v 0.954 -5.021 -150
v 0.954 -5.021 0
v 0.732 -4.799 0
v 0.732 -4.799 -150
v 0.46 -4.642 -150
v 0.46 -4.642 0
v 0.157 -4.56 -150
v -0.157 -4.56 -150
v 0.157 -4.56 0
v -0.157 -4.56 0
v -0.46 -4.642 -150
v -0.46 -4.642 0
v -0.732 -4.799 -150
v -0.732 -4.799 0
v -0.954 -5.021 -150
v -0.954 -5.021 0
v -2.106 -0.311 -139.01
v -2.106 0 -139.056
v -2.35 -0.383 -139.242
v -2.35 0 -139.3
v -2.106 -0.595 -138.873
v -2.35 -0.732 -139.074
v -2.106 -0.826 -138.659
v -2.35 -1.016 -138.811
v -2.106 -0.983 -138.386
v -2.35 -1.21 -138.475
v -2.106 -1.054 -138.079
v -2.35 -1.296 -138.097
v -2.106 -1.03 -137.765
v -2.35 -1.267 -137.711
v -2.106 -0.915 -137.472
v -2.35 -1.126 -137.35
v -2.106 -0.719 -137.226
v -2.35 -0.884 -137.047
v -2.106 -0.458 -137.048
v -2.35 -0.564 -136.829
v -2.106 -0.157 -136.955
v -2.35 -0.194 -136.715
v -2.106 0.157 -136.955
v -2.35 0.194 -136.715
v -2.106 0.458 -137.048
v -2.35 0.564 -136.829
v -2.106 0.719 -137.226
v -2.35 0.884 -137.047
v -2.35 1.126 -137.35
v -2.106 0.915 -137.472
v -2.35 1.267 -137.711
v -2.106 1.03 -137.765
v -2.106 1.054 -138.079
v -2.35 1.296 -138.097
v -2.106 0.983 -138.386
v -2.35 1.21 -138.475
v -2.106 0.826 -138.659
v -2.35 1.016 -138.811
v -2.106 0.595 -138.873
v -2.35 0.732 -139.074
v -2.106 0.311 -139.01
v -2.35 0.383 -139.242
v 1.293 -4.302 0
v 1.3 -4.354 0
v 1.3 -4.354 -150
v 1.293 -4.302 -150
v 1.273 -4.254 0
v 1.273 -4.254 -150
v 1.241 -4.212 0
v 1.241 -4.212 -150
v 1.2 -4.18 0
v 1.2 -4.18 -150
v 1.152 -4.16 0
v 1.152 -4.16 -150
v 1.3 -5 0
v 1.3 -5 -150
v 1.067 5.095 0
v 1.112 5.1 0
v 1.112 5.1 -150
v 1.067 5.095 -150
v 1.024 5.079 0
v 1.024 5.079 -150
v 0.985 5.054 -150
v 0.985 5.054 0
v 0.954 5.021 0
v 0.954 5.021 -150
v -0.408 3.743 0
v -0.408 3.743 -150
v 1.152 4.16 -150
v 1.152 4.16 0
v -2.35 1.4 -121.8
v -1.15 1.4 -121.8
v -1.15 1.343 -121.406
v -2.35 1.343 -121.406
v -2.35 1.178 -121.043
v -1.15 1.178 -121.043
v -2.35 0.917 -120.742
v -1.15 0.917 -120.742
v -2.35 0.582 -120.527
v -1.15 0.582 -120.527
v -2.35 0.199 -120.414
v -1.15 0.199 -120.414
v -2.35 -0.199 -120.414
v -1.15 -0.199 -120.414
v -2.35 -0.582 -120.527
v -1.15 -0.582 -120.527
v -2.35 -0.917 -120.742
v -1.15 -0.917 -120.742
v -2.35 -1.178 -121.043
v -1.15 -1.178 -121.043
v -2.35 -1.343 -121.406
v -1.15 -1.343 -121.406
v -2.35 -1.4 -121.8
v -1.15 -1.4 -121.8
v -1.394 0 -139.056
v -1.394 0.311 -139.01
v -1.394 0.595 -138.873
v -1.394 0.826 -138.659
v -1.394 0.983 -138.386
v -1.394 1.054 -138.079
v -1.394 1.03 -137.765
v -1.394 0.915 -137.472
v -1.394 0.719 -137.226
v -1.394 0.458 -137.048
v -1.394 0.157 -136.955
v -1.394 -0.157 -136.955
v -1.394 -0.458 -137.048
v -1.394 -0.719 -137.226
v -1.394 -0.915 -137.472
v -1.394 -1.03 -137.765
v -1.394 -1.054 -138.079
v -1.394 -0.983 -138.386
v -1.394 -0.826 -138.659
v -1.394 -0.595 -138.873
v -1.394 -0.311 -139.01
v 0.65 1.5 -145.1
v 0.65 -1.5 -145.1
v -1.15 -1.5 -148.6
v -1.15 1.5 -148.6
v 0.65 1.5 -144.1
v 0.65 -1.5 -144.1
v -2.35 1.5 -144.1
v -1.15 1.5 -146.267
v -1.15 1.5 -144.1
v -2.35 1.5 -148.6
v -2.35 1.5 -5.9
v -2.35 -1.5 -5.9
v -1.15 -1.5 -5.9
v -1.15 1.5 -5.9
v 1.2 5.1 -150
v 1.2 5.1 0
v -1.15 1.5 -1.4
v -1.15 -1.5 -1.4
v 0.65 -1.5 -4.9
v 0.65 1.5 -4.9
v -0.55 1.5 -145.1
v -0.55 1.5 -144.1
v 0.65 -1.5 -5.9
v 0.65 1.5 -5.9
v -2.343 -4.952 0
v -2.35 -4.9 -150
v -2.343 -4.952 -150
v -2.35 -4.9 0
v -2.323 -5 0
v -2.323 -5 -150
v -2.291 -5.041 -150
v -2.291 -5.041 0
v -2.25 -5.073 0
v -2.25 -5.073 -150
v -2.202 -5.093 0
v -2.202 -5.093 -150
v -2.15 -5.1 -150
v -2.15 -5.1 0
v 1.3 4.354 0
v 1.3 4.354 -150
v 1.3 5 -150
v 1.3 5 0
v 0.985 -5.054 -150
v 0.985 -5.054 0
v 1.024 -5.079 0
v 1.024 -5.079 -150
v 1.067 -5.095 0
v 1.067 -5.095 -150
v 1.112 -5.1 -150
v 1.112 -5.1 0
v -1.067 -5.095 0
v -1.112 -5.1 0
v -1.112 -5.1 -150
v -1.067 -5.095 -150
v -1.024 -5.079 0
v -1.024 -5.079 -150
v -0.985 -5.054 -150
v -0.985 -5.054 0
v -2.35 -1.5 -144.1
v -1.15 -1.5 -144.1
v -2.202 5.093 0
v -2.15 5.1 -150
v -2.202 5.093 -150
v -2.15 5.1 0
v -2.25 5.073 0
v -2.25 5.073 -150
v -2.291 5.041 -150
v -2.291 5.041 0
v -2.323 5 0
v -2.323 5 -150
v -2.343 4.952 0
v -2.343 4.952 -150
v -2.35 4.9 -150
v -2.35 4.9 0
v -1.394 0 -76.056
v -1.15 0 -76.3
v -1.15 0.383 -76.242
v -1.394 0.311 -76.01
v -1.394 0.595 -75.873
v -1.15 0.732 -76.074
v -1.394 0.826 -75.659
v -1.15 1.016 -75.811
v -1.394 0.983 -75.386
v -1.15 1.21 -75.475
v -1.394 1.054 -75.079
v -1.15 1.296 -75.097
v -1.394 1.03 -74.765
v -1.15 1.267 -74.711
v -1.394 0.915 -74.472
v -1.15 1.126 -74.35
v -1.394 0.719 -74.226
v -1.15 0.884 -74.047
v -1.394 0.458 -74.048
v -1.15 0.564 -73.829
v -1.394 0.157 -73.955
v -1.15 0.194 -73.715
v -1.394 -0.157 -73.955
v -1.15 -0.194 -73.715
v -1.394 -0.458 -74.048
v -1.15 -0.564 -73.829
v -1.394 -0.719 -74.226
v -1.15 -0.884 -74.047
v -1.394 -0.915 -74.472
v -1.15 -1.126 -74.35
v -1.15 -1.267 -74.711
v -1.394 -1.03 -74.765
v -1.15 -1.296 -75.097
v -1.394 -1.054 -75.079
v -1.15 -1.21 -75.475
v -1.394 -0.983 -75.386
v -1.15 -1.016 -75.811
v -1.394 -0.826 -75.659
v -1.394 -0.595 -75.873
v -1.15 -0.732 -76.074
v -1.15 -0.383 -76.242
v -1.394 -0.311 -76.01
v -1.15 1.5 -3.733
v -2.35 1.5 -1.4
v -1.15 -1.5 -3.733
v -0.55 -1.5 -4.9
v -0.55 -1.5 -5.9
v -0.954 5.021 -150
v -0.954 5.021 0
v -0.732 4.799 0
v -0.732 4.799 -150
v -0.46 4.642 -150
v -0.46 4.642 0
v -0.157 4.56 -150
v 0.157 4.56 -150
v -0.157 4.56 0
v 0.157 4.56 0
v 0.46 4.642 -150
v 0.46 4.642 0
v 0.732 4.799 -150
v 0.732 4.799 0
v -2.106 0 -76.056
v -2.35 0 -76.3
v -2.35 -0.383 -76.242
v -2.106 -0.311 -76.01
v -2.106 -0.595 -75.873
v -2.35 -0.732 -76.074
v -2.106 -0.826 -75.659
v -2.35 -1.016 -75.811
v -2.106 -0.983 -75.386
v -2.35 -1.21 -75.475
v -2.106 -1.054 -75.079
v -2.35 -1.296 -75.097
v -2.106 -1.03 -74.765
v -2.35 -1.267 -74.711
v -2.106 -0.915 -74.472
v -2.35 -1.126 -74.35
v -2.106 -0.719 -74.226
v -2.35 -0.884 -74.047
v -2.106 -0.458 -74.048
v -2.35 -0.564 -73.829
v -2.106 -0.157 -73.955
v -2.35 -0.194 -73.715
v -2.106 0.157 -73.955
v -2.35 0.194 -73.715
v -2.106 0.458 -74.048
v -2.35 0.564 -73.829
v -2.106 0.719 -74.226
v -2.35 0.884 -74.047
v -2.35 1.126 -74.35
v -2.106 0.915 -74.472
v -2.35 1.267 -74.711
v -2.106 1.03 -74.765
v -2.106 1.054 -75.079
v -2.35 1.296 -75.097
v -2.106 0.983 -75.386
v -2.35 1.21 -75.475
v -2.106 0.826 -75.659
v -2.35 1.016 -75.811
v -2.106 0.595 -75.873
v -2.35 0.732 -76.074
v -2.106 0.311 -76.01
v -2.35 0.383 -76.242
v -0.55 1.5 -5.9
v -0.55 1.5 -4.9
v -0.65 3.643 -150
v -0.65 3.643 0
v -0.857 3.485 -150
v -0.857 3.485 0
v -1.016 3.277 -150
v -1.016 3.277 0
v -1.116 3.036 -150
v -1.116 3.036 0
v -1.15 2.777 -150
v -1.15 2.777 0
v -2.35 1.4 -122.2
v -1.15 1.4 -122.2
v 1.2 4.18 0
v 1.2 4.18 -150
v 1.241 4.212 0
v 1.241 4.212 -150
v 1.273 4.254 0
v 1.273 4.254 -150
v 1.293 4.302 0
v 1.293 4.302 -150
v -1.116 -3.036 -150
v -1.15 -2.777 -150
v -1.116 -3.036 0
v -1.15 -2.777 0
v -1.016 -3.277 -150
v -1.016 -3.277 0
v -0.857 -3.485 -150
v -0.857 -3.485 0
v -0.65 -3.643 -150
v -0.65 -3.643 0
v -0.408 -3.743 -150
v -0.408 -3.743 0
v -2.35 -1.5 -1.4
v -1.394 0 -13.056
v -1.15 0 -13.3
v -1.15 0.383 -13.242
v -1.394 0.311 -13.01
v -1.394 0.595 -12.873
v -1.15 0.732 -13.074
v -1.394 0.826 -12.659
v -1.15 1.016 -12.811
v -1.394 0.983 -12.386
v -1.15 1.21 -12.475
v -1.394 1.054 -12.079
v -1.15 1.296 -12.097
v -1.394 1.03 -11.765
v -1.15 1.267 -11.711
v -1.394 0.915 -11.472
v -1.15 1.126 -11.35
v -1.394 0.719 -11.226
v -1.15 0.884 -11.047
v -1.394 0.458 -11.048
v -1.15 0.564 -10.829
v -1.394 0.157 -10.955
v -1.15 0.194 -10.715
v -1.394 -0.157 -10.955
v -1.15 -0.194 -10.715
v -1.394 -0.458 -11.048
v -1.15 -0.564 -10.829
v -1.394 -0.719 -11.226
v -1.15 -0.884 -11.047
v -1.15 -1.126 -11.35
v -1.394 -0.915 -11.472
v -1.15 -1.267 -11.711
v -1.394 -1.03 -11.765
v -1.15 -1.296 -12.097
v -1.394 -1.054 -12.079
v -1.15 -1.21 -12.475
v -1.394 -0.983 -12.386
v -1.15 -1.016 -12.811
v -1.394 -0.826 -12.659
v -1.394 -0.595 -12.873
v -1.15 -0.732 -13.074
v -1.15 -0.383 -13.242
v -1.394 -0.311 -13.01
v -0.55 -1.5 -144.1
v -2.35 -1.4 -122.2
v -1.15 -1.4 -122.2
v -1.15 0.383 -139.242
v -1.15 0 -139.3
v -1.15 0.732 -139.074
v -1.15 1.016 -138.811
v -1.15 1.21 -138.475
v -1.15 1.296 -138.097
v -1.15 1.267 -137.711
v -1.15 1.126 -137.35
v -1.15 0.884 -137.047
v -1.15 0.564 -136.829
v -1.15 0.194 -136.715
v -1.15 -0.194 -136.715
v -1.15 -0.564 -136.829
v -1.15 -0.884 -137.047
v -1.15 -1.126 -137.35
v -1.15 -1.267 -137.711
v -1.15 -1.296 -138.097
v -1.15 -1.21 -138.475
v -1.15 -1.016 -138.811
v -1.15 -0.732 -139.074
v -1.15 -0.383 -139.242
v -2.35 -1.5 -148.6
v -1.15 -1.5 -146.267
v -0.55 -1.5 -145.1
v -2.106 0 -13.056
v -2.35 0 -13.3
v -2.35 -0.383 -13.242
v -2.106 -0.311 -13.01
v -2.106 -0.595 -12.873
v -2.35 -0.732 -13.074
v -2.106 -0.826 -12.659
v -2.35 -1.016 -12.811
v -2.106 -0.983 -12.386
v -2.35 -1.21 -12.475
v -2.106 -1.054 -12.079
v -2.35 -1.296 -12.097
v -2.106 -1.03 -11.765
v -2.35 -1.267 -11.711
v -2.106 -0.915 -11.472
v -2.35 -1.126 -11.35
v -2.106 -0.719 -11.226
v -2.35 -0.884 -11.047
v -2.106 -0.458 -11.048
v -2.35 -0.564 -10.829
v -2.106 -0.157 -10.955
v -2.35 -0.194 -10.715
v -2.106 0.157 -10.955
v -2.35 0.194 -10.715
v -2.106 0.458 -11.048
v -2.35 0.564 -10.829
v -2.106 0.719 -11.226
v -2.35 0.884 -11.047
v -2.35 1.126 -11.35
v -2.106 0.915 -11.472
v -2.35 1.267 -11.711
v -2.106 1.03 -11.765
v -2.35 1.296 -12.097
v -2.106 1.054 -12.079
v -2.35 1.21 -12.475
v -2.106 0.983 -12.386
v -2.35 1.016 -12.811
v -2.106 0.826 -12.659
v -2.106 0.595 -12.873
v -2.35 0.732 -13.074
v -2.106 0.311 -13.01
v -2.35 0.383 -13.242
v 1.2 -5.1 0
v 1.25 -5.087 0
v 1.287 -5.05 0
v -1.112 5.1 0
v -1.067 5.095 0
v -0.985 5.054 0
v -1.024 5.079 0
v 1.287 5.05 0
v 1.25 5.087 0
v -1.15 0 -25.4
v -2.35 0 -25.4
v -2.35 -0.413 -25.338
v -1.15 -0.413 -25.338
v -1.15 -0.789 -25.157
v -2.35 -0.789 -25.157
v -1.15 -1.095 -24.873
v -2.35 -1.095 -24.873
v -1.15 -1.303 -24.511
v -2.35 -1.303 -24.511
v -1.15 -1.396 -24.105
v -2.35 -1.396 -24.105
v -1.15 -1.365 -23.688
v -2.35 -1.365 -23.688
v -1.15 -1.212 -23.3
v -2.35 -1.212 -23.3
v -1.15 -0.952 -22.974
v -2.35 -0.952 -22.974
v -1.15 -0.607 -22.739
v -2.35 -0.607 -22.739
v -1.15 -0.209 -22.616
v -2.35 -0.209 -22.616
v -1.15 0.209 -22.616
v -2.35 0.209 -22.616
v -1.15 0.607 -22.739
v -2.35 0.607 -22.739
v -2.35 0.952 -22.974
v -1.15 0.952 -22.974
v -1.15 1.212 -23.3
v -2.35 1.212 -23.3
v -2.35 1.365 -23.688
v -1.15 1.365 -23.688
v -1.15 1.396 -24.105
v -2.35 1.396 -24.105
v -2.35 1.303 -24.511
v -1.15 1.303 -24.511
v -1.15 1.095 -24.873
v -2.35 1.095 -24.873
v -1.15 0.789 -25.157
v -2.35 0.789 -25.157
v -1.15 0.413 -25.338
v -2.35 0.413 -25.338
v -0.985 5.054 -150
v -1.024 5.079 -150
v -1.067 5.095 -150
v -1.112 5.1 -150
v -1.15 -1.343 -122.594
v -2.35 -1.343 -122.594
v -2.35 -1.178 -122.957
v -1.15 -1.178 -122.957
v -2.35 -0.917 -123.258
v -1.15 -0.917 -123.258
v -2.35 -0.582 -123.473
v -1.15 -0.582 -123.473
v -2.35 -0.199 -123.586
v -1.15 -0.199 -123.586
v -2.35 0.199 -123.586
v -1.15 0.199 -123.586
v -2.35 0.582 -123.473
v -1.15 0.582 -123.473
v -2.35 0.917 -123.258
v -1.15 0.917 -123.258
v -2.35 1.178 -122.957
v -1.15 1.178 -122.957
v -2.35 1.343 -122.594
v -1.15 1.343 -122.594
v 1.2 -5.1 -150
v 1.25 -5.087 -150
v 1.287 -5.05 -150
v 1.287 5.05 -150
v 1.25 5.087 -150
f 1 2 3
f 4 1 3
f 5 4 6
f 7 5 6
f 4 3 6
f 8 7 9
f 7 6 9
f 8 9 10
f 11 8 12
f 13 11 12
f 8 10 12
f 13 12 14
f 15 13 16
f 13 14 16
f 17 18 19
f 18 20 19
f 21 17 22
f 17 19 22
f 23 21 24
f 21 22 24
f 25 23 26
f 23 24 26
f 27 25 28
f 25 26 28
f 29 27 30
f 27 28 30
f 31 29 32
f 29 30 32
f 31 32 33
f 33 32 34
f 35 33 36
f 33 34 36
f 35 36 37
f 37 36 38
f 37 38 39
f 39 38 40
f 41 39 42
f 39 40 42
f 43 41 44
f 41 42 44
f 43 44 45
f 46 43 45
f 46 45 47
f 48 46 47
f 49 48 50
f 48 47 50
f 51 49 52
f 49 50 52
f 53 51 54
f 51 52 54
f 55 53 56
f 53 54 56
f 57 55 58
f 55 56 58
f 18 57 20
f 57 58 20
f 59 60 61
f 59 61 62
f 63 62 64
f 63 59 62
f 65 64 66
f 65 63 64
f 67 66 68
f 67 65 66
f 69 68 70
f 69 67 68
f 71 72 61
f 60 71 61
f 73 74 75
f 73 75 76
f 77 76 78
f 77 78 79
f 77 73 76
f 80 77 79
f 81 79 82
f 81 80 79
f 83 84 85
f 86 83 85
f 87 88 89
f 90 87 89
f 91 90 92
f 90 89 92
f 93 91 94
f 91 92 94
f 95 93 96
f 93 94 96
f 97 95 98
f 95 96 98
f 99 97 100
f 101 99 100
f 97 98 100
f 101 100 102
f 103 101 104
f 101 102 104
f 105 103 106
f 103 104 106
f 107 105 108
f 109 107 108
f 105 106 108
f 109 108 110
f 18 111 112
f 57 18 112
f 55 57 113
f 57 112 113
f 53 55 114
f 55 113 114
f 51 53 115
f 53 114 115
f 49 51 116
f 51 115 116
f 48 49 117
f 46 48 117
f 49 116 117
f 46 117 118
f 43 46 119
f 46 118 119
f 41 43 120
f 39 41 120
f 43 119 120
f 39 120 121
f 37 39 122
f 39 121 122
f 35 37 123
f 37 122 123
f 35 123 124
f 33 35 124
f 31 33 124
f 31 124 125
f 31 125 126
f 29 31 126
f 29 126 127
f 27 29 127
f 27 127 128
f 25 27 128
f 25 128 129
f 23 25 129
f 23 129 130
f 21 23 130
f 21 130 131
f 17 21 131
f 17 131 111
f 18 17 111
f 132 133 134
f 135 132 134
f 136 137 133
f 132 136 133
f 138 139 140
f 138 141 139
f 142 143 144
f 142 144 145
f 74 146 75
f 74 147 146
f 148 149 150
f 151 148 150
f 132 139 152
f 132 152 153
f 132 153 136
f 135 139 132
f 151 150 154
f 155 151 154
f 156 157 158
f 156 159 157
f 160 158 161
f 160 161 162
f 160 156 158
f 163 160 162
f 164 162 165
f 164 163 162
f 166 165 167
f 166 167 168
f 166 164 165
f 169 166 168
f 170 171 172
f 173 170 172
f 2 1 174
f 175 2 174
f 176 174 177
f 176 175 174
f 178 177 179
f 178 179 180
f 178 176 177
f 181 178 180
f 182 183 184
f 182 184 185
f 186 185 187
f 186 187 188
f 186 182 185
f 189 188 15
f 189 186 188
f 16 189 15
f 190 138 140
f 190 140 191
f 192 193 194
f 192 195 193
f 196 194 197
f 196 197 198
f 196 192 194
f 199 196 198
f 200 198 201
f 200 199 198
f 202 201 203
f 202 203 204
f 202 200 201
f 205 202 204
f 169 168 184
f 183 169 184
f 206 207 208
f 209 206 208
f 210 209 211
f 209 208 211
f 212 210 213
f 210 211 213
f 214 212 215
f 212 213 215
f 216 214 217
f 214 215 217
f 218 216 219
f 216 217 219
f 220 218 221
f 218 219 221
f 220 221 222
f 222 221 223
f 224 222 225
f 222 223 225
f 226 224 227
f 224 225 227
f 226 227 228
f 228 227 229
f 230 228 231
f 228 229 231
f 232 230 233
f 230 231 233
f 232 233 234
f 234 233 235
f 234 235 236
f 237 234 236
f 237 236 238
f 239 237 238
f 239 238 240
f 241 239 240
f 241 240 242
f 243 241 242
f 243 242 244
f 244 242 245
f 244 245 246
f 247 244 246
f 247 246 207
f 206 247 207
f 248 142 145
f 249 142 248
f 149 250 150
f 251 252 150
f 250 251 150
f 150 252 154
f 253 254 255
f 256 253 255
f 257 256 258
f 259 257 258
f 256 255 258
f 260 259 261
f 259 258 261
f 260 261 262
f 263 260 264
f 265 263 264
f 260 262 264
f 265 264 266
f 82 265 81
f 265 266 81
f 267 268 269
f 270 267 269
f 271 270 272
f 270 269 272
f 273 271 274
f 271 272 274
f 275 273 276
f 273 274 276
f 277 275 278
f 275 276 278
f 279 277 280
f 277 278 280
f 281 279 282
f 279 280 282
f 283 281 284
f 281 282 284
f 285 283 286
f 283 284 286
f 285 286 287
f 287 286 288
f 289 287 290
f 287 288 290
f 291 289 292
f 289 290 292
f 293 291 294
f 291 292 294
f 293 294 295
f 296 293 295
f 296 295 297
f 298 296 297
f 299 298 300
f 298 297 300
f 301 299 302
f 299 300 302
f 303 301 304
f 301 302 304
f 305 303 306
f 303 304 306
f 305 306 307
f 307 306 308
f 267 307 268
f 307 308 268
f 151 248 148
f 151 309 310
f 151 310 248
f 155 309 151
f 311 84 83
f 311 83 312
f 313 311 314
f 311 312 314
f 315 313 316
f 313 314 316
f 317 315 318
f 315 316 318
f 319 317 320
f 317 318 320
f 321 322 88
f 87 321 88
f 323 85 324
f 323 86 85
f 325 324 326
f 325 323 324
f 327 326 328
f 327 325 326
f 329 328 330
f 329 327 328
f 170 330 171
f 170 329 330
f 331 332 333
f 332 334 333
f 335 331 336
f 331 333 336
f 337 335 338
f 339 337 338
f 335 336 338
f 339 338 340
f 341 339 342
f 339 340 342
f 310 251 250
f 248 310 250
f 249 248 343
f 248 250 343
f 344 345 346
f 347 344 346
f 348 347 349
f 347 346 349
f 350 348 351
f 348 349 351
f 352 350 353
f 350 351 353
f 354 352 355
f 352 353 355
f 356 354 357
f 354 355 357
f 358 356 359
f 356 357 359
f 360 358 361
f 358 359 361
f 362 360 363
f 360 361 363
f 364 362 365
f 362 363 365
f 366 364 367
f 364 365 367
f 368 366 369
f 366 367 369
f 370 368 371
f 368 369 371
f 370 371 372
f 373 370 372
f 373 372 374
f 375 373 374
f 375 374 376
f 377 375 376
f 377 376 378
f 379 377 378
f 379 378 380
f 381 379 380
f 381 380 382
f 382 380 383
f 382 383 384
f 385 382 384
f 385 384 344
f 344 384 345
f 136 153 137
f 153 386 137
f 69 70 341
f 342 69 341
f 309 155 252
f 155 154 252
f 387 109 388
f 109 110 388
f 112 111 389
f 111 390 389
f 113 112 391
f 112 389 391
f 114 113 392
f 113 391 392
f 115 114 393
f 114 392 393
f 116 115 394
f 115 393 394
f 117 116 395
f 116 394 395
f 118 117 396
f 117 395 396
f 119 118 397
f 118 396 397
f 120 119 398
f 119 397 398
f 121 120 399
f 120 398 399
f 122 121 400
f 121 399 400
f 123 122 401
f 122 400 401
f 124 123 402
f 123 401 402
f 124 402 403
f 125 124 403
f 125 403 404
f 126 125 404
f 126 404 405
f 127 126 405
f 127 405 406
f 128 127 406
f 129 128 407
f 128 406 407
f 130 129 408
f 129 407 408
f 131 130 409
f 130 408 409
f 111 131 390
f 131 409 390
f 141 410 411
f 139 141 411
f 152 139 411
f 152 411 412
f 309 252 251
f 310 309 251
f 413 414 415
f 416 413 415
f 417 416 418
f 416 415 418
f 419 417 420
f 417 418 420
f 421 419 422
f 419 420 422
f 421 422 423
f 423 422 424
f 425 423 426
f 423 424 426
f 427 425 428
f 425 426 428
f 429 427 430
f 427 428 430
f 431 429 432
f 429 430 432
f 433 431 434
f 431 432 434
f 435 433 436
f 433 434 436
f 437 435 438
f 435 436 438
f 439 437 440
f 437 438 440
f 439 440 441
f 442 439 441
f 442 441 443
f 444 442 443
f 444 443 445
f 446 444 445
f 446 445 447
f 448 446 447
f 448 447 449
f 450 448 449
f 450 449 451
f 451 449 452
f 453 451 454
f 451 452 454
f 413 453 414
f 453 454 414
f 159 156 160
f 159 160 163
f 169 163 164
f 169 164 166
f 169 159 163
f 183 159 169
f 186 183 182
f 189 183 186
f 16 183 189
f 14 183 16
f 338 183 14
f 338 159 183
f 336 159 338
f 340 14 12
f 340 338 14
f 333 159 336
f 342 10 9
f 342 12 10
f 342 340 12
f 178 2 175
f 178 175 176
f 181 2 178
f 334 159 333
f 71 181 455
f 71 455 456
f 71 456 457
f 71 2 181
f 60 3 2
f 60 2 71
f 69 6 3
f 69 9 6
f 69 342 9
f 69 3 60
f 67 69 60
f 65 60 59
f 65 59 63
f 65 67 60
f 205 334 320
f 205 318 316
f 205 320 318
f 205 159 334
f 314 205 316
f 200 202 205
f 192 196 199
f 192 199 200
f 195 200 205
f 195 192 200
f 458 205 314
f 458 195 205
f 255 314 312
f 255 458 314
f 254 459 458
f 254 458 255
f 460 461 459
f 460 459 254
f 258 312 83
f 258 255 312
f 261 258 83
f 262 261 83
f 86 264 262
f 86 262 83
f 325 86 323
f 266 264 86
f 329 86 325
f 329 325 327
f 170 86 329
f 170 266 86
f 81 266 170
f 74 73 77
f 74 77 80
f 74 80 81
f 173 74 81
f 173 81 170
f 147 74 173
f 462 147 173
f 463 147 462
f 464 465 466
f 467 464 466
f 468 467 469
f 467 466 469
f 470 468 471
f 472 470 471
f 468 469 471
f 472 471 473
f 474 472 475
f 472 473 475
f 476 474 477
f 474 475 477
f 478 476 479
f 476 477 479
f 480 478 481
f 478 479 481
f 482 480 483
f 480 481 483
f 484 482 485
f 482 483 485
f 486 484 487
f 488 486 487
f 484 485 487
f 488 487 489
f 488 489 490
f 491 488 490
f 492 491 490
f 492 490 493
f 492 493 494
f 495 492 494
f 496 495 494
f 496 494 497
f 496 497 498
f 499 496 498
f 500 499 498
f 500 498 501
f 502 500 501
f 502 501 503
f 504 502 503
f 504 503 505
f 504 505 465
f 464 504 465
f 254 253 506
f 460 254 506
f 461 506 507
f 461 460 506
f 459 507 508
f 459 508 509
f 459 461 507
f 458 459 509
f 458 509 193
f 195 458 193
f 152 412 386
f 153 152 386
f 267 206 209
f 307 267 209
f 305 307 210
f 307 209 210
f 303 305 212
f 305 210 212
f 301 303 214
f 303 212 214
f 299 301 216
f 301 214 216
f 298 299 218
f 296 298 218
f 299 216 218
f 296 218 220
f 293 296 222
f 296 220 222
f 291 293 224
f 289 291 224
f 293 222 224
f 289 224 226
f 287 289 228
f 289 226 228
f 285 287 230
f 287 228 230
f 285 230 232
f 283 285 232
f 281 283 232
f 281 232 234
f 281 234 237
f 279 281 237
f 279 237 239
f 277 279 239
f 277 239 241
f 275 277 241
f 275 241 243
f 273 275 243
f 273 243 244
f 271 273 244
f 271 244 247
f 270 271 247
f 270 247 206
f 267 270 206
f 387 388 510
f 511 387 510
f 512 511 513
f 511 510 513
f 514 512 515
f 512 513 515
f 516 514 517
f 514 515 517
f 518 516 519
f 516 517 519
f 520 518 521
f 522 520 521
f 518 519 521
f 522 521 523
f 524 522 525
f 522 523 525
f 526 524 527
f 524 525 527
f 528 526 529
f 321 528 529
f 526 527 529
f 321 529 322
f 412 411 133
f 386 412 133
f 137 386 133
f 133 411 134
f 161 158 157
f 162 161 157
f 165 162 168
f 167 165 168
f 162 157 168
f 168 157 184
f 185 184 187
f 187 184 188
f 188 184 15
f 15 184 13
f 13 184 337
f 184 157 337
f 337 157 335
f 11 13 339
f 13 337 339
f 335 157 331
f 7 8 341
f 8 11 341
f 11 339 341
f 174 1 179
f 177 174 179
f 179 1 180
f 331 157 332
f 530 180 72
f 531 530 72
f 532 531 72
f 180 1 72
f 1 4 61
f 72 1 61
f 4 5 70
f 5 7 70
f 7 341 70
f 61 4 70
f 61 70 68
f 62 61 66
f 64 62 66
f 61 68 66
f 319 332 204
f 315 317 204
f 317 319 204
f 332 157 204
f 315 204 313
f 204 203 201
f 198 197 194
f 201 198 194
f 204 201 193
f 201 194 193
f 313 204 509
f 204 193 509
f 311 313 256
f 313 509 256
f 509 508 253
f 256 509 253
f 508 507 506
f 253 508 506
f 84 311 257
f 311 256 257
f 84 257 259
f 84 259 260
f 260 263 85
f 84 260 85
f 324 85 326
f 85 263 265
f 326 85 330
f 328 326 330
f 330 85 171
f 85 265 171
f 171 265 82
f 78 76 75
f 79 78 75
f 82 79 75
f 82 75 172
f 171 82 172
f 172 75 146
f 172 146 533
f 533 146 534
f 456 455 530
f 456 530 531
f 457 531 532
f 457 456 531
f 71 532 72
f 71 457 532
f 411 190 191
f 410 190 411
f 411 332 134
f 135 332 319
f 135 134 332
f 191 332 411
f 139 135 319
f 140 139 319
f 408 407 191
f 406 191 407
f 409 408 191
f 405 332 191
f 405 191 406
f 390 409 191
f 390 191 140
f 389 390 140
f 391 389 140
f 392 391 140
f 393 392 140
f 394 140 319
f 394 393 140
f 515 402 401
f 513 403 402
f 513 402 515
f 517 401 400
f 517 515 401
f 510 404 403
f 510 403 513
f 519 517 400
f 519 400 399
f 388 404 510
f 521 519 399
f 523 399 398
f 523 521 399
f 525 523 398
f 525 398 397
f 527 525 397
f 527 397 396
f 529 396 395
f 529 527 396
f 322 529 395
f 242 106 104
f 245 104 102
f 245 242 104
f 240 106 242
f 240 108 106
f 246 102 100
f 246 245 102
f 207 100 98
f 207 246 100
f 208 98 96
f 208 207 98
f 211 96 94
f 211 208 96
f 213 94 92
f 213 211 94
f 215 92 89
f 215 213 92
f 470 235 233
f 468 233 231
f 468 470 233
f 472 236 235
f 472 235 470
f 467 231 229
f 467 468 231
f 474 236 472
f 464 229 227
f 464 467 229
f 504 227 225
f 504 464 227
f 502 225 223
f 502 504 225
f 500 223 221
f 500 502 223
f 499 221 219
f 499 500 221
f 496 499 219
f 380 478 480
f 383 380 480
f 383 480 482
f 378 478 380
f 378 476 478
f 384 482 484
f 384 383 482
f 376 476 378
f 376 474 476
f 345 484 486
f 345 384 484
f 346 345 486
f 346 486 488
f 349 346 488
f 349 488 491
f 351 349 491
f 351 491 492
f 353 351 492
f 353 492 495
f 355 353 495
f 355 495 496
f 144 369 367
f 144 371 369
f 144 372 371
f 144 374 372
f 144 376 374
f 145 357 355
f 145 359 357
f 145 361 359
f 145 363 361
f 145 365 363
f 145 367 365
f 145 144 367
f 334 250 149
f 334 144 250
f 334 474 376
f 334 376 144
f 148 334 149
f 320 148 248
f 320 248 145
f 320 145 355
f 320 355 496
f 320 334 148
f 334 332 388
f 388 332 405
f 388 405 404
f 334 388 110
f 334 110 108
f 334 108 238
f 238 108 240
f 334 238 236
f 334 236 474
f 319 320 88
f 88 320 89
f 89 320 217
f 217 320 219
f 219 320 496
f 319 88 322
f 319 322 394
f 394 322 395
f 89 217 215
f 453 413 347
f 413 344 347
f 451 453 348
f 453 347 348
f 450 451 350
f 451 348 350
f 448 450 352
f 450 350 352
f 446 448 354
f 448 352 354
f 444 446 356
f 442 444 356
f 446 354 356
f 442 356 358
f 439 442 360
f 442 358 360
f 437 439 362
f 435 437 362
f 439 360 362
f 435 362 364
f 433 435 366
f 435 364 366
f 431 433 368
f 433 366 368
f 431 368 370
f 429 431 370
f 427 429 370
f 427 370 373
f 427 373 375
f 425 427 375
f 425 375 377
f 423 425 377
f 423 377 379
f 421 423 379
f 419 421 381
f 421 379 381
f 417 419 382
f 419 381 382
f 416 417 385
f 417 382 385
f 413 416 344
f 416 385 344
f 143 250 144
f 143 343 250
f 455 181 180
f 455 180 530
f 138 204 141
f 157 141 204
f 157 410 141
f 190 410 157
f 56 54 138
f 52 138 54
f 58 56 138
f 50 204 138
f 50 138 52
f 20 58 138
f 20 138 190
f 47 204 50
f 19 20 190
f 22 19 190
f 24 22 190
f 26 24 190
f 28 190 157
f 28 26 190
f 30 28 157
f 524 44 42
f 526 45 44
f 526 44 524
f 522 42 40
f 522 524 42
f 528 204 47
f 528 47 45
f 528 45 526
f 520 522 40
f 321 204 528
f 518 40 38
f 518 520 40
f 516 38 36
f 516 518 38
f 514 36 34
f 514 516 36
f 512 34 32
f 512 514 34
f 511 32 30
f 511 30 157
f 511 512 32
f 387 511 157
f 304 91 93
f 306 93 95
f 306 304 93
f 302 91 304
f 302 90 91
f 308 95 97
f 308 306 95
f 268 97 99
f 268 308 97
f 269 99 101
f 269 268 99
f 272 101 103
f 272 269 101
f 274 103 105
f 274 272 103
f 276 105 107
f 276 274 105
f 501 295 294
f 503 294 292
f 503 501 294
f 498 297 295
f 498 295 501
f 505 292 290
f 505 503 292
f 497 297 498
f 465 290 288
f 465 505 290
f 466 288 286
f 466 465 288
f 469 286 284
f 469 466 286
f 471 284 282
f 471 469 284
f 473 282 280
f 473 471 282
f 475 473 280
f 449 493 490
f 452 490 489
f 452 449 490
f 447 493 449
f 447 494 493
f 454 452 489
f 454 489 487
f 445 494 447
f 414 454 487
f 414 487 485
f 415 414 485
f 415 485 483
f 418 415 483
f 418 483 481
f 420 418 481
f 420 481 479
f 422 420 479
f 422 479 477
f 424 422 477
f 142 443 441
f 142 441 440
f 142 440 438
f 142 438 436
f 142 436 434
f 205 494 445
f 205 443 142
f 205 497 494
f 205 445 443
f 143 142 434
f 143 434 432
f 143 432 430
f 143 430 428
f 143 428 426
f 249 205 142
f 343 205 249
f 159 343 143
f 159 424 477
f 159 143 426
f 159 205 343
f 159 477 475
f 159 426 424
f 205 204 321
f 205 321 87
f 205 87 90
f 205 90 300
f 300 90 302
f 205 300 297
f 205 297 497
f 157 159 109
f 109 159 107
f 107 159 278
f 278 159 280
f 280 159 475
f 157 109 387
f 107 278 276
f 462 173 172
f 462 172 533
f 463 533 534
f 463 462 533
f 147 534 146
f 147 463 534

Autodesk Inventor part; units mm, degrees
sketch "_____1" plane through (0, 0, 0) normal (0, 0, 1) x (1, 0, 0)
  line L0 (-2.35, 4.9) -> (-2.35, -4.9)
  arc A0 (-2.35, -4.9) -> (-2.15, -5.1) centre (-2.15, -4.9) ccw
  line L1 (-2.15, -5.1) -> (-1.1124, -5.1)
  arc A1 (-1.1124, -5.1) -> (-0.9535, -5.0214) centre (-1.1124, -4.9) ccw
  arc A2 (0.9535, -5.0214) -> (-0.9535, -5.0214) centre (0, -5.75) ccw
  arc A3 (0.9535, -5.0214) -> (1.1124, -5.1) centre (1.1124, -4.9) ccw
  line L2 (1.1124, -5.1) -> (1.2, -5.1)
  arc A4 (1.2, -5.1) -> (1.3, -5) centre (1.2, -5) ccw
  line L3 (1.3, -5) -> (1.3, -4.3536)
  arc A5 (1.3, -4.3536) -> (1.1517, -4.1603) centre (1.1, -4.3536) ccw
  line L4 (1.1517, -4.1603) -> (-0.4083, -3.7433)
  arc A6 (-1.15, -2.7772) -> (-0.4083, -3.7433) centre (-0.15, -2.7772) ccw
  line L5 (-1.15, -2.7772) -> (-1.15, 2.7772)
  arc A7 (-0.4083, 3.7433) -> (-1.15, 2.7772) centre (-0.15, 2.7772) ccw
  line L6 (-0.4083, 3.7433) -> (1.1517, 4.1603)
  arc A8 (1.1517, 4.1603) -> (1.3, 4.3536) centre (1.1, 4.3536) ccw
  line L7 (1.3, 4.3536) -> (1.3, 5)
  arc A9 (1.3, 5) -> (1.2, 5.1) centre (1.2, 5) ccw
  line L8 (1.2, 5.1) -> (1.1124, 5.1)
  arc A10 (1.1124, 5.1) -> (0.9535, 5.0214) centre (1.1124, 4.9) ccw
  arc A11 (-0.9535, 5.0214) -> (0.9535, 5.0214) centre (0, 5.75) ccw
  arc A12 (-0.9535, 5.0214) -> (-1.1124, 5.1) centre (-1.1124, 4.9) ccw
  line L9 (-1.1124, 5.1) -> (-2.15, 5.1)
  arc A13 (-2.15, 5.1) -> (-2.35, 4.9) centre (-2.15, 4.9) ccw
extrude "Extrusion1" add sketch "_____1" against normal blind 150
sketch "_____2" plane through (-2.35, 0, 0) normal (1, 0, 0) x (0, 0, -1)
  line L0 (1.4, 1.5) -> (1.4, -1.5)
  line L1 (1.4, -1.5) -> (5.9, -1.5)
  line L2 (5.9, -1.5) -> (5.9, 1.5)
  line L3 (5.9, 1.5) -> (1.4, 1.5)
extrude "Extrusion2" cut sketch "_____2" along normal blind 1.2
sketch "_____3" plane through (-2.35, 0, 0) normal (1, 0, 0) x (0, 0, -1)
  line L0 (144.1, 1.5) -> (144.1, -1.5)
  line L1 (144.1, -1.5) -> (148.6, -1.5)
  line L2 (148.6, -1.5) -> (148.6, 1.5)
  line L3 (148.6, 1.5) -> (144.1, 1.5)
extrude "Extrusion3" cut sketch "_____3" along normal blind 1.2
sketch "_____4" plane through (0, 0, 0) normal (0, 1, 0) x (1, 0, 0)
  line L0 (-2.35, 1.4) -> (-1.15, 1.4)
  line L1 (-1.15, 1.4) -> (0.65, 4.9)
  line L2 (0.65, 4.9) -> (0.65, 5.9)
  line L3 (0.65, 5.9) -> (-0.55, 5.9)
  line L4 (-0.55, 5.9) -> (-0.55, 4.9)
  line L5 (-0.55, 4.9) -> (-2.35, 1.4)
extrude "Extrusion4" add sketch "_____4" along normal mid plane 3
sketch "_____5" plane through (0, 0, 0) normal (0, 1, 0) x (1, 0, 0)
  line L0 (-2.35, 148.6) -> (-0.55, 145.1)
  line L1 (-0.55, 145.1) -> (-0.55, 144.1)
  line L2 (-0.55, 144.1) -> (0.65, 144.1)
  line L3 (0.65, 144.1) -> (0.65, 145.1)
  line L4 (0.65, 145.1) -> (-1.15, 148.6)
  line L5 (-1.15, 148.6) -> (-2.35, 148.6)
extrude "Extrusion5" add sketch "_____5" along normal mid plane 3
sketch "_____6" plane through (0, 0, 0) normal (0, 1, 0) x (1, 0, 0)
  line L0 (-1.15, 12) -> (-2.35, 12)
  line L1 (-2.35, 12) -> (-2.35, 13.3)
  line L2 (-2.35, 13.3) -> (-2.1065, 13.0565)
  line L3 (-2.1065, 13.0565) -> (-1.3935, 13.0565)
  line L4 (-1.3935, 13.0565) -> (-1.15, 13.3)
  line L5 (-1.15, 13.3) -> (-1.15, 12)
  line L6 (-1.15, 12) -> (-2.35, 12)
revolve "Revolution1" cut sketch "_____6" angle 360 about axis through (-1.15, 0, -12) along (1, 0, 0)
thread "Thread1" size "M2.6x0.45" class "6H" standard "ISO Metric profile" full length
pattern_linear "Rectangular Pattern1" count 2 spacing 126 along (0, 0, -1) of "Revolution1"
sketch "_____10" plane through (0, 0, 0) normal (0, 1, 0) x (1, 0, 0)
  line L0 (-1.15, 75) -> (-2.35, 75)
  line L1 (-2.35, 75) -> (-2.35, 76.3)
  line L2 (-2.35, 76.3) -> (-2.1065, 76.0565)
  line L3 (-2.1065, 76.0565) -> (-1.3935, 76.0565)
  line L4 (-1.3935, 76.0565) -> (-1.15, 76.3)
  line L5 (-1.15, 76.3) -> (-1.15, 75)
  line L6 (-1.15, 75) -> (-2.35, 75)
revolve "Revolution2" cut sketch "_____10" angle 360 about axis through (-1.15, 0, -75) along (1, 0, 0)
thread "Thread2" size "M2.6x0.45" class "6H" standard "ISO Metric profile" full length
sketch "Sketch8" plane through (-1.15, -2.7772, 0) normal (1, 0, 0) x (0, 0, -1)
  point P0 (24, 2.7772)
hole "Hole1" at (-1.15, 0, -24) direction (-1, 0, 0) diameter 2.8 depth 1.2
sketch "_____8" plane through (-1.15, 0, 0) normal (1, 0, 0) x (0, 0, -1)
  arc A0 (121.8, 1.4) -> (121.8, -1.4) centre (121.8, 0) ccw
  line L0 (121.8, -1.4) -> (122.2, -1.4)
  arc A1 (122.2, -1.4) -> (122.2, 1.4) centre (122.2, 0) ccw
  line L1 (122.2, 1.4) -> (121.8, 1.4)
extrude "Extrusion6" cut sketch "_____8" against normal blind 1.2
ref_plane "to_retainer_XY" through (0, 0, -150) normal (0, 0, -1) x (1, 0, 0)
ref_plane "to_retainer_YZ" through (0, 0, -150) normal (1, 0, 0) x (0, -1, 0)
ref_plane "to_retainer_ZX" through (0, 0, -150) normal (0, -1, 0) x (0, 0, -1)
properties part number "SSRC215_ir" material "ステンレス鋼"
